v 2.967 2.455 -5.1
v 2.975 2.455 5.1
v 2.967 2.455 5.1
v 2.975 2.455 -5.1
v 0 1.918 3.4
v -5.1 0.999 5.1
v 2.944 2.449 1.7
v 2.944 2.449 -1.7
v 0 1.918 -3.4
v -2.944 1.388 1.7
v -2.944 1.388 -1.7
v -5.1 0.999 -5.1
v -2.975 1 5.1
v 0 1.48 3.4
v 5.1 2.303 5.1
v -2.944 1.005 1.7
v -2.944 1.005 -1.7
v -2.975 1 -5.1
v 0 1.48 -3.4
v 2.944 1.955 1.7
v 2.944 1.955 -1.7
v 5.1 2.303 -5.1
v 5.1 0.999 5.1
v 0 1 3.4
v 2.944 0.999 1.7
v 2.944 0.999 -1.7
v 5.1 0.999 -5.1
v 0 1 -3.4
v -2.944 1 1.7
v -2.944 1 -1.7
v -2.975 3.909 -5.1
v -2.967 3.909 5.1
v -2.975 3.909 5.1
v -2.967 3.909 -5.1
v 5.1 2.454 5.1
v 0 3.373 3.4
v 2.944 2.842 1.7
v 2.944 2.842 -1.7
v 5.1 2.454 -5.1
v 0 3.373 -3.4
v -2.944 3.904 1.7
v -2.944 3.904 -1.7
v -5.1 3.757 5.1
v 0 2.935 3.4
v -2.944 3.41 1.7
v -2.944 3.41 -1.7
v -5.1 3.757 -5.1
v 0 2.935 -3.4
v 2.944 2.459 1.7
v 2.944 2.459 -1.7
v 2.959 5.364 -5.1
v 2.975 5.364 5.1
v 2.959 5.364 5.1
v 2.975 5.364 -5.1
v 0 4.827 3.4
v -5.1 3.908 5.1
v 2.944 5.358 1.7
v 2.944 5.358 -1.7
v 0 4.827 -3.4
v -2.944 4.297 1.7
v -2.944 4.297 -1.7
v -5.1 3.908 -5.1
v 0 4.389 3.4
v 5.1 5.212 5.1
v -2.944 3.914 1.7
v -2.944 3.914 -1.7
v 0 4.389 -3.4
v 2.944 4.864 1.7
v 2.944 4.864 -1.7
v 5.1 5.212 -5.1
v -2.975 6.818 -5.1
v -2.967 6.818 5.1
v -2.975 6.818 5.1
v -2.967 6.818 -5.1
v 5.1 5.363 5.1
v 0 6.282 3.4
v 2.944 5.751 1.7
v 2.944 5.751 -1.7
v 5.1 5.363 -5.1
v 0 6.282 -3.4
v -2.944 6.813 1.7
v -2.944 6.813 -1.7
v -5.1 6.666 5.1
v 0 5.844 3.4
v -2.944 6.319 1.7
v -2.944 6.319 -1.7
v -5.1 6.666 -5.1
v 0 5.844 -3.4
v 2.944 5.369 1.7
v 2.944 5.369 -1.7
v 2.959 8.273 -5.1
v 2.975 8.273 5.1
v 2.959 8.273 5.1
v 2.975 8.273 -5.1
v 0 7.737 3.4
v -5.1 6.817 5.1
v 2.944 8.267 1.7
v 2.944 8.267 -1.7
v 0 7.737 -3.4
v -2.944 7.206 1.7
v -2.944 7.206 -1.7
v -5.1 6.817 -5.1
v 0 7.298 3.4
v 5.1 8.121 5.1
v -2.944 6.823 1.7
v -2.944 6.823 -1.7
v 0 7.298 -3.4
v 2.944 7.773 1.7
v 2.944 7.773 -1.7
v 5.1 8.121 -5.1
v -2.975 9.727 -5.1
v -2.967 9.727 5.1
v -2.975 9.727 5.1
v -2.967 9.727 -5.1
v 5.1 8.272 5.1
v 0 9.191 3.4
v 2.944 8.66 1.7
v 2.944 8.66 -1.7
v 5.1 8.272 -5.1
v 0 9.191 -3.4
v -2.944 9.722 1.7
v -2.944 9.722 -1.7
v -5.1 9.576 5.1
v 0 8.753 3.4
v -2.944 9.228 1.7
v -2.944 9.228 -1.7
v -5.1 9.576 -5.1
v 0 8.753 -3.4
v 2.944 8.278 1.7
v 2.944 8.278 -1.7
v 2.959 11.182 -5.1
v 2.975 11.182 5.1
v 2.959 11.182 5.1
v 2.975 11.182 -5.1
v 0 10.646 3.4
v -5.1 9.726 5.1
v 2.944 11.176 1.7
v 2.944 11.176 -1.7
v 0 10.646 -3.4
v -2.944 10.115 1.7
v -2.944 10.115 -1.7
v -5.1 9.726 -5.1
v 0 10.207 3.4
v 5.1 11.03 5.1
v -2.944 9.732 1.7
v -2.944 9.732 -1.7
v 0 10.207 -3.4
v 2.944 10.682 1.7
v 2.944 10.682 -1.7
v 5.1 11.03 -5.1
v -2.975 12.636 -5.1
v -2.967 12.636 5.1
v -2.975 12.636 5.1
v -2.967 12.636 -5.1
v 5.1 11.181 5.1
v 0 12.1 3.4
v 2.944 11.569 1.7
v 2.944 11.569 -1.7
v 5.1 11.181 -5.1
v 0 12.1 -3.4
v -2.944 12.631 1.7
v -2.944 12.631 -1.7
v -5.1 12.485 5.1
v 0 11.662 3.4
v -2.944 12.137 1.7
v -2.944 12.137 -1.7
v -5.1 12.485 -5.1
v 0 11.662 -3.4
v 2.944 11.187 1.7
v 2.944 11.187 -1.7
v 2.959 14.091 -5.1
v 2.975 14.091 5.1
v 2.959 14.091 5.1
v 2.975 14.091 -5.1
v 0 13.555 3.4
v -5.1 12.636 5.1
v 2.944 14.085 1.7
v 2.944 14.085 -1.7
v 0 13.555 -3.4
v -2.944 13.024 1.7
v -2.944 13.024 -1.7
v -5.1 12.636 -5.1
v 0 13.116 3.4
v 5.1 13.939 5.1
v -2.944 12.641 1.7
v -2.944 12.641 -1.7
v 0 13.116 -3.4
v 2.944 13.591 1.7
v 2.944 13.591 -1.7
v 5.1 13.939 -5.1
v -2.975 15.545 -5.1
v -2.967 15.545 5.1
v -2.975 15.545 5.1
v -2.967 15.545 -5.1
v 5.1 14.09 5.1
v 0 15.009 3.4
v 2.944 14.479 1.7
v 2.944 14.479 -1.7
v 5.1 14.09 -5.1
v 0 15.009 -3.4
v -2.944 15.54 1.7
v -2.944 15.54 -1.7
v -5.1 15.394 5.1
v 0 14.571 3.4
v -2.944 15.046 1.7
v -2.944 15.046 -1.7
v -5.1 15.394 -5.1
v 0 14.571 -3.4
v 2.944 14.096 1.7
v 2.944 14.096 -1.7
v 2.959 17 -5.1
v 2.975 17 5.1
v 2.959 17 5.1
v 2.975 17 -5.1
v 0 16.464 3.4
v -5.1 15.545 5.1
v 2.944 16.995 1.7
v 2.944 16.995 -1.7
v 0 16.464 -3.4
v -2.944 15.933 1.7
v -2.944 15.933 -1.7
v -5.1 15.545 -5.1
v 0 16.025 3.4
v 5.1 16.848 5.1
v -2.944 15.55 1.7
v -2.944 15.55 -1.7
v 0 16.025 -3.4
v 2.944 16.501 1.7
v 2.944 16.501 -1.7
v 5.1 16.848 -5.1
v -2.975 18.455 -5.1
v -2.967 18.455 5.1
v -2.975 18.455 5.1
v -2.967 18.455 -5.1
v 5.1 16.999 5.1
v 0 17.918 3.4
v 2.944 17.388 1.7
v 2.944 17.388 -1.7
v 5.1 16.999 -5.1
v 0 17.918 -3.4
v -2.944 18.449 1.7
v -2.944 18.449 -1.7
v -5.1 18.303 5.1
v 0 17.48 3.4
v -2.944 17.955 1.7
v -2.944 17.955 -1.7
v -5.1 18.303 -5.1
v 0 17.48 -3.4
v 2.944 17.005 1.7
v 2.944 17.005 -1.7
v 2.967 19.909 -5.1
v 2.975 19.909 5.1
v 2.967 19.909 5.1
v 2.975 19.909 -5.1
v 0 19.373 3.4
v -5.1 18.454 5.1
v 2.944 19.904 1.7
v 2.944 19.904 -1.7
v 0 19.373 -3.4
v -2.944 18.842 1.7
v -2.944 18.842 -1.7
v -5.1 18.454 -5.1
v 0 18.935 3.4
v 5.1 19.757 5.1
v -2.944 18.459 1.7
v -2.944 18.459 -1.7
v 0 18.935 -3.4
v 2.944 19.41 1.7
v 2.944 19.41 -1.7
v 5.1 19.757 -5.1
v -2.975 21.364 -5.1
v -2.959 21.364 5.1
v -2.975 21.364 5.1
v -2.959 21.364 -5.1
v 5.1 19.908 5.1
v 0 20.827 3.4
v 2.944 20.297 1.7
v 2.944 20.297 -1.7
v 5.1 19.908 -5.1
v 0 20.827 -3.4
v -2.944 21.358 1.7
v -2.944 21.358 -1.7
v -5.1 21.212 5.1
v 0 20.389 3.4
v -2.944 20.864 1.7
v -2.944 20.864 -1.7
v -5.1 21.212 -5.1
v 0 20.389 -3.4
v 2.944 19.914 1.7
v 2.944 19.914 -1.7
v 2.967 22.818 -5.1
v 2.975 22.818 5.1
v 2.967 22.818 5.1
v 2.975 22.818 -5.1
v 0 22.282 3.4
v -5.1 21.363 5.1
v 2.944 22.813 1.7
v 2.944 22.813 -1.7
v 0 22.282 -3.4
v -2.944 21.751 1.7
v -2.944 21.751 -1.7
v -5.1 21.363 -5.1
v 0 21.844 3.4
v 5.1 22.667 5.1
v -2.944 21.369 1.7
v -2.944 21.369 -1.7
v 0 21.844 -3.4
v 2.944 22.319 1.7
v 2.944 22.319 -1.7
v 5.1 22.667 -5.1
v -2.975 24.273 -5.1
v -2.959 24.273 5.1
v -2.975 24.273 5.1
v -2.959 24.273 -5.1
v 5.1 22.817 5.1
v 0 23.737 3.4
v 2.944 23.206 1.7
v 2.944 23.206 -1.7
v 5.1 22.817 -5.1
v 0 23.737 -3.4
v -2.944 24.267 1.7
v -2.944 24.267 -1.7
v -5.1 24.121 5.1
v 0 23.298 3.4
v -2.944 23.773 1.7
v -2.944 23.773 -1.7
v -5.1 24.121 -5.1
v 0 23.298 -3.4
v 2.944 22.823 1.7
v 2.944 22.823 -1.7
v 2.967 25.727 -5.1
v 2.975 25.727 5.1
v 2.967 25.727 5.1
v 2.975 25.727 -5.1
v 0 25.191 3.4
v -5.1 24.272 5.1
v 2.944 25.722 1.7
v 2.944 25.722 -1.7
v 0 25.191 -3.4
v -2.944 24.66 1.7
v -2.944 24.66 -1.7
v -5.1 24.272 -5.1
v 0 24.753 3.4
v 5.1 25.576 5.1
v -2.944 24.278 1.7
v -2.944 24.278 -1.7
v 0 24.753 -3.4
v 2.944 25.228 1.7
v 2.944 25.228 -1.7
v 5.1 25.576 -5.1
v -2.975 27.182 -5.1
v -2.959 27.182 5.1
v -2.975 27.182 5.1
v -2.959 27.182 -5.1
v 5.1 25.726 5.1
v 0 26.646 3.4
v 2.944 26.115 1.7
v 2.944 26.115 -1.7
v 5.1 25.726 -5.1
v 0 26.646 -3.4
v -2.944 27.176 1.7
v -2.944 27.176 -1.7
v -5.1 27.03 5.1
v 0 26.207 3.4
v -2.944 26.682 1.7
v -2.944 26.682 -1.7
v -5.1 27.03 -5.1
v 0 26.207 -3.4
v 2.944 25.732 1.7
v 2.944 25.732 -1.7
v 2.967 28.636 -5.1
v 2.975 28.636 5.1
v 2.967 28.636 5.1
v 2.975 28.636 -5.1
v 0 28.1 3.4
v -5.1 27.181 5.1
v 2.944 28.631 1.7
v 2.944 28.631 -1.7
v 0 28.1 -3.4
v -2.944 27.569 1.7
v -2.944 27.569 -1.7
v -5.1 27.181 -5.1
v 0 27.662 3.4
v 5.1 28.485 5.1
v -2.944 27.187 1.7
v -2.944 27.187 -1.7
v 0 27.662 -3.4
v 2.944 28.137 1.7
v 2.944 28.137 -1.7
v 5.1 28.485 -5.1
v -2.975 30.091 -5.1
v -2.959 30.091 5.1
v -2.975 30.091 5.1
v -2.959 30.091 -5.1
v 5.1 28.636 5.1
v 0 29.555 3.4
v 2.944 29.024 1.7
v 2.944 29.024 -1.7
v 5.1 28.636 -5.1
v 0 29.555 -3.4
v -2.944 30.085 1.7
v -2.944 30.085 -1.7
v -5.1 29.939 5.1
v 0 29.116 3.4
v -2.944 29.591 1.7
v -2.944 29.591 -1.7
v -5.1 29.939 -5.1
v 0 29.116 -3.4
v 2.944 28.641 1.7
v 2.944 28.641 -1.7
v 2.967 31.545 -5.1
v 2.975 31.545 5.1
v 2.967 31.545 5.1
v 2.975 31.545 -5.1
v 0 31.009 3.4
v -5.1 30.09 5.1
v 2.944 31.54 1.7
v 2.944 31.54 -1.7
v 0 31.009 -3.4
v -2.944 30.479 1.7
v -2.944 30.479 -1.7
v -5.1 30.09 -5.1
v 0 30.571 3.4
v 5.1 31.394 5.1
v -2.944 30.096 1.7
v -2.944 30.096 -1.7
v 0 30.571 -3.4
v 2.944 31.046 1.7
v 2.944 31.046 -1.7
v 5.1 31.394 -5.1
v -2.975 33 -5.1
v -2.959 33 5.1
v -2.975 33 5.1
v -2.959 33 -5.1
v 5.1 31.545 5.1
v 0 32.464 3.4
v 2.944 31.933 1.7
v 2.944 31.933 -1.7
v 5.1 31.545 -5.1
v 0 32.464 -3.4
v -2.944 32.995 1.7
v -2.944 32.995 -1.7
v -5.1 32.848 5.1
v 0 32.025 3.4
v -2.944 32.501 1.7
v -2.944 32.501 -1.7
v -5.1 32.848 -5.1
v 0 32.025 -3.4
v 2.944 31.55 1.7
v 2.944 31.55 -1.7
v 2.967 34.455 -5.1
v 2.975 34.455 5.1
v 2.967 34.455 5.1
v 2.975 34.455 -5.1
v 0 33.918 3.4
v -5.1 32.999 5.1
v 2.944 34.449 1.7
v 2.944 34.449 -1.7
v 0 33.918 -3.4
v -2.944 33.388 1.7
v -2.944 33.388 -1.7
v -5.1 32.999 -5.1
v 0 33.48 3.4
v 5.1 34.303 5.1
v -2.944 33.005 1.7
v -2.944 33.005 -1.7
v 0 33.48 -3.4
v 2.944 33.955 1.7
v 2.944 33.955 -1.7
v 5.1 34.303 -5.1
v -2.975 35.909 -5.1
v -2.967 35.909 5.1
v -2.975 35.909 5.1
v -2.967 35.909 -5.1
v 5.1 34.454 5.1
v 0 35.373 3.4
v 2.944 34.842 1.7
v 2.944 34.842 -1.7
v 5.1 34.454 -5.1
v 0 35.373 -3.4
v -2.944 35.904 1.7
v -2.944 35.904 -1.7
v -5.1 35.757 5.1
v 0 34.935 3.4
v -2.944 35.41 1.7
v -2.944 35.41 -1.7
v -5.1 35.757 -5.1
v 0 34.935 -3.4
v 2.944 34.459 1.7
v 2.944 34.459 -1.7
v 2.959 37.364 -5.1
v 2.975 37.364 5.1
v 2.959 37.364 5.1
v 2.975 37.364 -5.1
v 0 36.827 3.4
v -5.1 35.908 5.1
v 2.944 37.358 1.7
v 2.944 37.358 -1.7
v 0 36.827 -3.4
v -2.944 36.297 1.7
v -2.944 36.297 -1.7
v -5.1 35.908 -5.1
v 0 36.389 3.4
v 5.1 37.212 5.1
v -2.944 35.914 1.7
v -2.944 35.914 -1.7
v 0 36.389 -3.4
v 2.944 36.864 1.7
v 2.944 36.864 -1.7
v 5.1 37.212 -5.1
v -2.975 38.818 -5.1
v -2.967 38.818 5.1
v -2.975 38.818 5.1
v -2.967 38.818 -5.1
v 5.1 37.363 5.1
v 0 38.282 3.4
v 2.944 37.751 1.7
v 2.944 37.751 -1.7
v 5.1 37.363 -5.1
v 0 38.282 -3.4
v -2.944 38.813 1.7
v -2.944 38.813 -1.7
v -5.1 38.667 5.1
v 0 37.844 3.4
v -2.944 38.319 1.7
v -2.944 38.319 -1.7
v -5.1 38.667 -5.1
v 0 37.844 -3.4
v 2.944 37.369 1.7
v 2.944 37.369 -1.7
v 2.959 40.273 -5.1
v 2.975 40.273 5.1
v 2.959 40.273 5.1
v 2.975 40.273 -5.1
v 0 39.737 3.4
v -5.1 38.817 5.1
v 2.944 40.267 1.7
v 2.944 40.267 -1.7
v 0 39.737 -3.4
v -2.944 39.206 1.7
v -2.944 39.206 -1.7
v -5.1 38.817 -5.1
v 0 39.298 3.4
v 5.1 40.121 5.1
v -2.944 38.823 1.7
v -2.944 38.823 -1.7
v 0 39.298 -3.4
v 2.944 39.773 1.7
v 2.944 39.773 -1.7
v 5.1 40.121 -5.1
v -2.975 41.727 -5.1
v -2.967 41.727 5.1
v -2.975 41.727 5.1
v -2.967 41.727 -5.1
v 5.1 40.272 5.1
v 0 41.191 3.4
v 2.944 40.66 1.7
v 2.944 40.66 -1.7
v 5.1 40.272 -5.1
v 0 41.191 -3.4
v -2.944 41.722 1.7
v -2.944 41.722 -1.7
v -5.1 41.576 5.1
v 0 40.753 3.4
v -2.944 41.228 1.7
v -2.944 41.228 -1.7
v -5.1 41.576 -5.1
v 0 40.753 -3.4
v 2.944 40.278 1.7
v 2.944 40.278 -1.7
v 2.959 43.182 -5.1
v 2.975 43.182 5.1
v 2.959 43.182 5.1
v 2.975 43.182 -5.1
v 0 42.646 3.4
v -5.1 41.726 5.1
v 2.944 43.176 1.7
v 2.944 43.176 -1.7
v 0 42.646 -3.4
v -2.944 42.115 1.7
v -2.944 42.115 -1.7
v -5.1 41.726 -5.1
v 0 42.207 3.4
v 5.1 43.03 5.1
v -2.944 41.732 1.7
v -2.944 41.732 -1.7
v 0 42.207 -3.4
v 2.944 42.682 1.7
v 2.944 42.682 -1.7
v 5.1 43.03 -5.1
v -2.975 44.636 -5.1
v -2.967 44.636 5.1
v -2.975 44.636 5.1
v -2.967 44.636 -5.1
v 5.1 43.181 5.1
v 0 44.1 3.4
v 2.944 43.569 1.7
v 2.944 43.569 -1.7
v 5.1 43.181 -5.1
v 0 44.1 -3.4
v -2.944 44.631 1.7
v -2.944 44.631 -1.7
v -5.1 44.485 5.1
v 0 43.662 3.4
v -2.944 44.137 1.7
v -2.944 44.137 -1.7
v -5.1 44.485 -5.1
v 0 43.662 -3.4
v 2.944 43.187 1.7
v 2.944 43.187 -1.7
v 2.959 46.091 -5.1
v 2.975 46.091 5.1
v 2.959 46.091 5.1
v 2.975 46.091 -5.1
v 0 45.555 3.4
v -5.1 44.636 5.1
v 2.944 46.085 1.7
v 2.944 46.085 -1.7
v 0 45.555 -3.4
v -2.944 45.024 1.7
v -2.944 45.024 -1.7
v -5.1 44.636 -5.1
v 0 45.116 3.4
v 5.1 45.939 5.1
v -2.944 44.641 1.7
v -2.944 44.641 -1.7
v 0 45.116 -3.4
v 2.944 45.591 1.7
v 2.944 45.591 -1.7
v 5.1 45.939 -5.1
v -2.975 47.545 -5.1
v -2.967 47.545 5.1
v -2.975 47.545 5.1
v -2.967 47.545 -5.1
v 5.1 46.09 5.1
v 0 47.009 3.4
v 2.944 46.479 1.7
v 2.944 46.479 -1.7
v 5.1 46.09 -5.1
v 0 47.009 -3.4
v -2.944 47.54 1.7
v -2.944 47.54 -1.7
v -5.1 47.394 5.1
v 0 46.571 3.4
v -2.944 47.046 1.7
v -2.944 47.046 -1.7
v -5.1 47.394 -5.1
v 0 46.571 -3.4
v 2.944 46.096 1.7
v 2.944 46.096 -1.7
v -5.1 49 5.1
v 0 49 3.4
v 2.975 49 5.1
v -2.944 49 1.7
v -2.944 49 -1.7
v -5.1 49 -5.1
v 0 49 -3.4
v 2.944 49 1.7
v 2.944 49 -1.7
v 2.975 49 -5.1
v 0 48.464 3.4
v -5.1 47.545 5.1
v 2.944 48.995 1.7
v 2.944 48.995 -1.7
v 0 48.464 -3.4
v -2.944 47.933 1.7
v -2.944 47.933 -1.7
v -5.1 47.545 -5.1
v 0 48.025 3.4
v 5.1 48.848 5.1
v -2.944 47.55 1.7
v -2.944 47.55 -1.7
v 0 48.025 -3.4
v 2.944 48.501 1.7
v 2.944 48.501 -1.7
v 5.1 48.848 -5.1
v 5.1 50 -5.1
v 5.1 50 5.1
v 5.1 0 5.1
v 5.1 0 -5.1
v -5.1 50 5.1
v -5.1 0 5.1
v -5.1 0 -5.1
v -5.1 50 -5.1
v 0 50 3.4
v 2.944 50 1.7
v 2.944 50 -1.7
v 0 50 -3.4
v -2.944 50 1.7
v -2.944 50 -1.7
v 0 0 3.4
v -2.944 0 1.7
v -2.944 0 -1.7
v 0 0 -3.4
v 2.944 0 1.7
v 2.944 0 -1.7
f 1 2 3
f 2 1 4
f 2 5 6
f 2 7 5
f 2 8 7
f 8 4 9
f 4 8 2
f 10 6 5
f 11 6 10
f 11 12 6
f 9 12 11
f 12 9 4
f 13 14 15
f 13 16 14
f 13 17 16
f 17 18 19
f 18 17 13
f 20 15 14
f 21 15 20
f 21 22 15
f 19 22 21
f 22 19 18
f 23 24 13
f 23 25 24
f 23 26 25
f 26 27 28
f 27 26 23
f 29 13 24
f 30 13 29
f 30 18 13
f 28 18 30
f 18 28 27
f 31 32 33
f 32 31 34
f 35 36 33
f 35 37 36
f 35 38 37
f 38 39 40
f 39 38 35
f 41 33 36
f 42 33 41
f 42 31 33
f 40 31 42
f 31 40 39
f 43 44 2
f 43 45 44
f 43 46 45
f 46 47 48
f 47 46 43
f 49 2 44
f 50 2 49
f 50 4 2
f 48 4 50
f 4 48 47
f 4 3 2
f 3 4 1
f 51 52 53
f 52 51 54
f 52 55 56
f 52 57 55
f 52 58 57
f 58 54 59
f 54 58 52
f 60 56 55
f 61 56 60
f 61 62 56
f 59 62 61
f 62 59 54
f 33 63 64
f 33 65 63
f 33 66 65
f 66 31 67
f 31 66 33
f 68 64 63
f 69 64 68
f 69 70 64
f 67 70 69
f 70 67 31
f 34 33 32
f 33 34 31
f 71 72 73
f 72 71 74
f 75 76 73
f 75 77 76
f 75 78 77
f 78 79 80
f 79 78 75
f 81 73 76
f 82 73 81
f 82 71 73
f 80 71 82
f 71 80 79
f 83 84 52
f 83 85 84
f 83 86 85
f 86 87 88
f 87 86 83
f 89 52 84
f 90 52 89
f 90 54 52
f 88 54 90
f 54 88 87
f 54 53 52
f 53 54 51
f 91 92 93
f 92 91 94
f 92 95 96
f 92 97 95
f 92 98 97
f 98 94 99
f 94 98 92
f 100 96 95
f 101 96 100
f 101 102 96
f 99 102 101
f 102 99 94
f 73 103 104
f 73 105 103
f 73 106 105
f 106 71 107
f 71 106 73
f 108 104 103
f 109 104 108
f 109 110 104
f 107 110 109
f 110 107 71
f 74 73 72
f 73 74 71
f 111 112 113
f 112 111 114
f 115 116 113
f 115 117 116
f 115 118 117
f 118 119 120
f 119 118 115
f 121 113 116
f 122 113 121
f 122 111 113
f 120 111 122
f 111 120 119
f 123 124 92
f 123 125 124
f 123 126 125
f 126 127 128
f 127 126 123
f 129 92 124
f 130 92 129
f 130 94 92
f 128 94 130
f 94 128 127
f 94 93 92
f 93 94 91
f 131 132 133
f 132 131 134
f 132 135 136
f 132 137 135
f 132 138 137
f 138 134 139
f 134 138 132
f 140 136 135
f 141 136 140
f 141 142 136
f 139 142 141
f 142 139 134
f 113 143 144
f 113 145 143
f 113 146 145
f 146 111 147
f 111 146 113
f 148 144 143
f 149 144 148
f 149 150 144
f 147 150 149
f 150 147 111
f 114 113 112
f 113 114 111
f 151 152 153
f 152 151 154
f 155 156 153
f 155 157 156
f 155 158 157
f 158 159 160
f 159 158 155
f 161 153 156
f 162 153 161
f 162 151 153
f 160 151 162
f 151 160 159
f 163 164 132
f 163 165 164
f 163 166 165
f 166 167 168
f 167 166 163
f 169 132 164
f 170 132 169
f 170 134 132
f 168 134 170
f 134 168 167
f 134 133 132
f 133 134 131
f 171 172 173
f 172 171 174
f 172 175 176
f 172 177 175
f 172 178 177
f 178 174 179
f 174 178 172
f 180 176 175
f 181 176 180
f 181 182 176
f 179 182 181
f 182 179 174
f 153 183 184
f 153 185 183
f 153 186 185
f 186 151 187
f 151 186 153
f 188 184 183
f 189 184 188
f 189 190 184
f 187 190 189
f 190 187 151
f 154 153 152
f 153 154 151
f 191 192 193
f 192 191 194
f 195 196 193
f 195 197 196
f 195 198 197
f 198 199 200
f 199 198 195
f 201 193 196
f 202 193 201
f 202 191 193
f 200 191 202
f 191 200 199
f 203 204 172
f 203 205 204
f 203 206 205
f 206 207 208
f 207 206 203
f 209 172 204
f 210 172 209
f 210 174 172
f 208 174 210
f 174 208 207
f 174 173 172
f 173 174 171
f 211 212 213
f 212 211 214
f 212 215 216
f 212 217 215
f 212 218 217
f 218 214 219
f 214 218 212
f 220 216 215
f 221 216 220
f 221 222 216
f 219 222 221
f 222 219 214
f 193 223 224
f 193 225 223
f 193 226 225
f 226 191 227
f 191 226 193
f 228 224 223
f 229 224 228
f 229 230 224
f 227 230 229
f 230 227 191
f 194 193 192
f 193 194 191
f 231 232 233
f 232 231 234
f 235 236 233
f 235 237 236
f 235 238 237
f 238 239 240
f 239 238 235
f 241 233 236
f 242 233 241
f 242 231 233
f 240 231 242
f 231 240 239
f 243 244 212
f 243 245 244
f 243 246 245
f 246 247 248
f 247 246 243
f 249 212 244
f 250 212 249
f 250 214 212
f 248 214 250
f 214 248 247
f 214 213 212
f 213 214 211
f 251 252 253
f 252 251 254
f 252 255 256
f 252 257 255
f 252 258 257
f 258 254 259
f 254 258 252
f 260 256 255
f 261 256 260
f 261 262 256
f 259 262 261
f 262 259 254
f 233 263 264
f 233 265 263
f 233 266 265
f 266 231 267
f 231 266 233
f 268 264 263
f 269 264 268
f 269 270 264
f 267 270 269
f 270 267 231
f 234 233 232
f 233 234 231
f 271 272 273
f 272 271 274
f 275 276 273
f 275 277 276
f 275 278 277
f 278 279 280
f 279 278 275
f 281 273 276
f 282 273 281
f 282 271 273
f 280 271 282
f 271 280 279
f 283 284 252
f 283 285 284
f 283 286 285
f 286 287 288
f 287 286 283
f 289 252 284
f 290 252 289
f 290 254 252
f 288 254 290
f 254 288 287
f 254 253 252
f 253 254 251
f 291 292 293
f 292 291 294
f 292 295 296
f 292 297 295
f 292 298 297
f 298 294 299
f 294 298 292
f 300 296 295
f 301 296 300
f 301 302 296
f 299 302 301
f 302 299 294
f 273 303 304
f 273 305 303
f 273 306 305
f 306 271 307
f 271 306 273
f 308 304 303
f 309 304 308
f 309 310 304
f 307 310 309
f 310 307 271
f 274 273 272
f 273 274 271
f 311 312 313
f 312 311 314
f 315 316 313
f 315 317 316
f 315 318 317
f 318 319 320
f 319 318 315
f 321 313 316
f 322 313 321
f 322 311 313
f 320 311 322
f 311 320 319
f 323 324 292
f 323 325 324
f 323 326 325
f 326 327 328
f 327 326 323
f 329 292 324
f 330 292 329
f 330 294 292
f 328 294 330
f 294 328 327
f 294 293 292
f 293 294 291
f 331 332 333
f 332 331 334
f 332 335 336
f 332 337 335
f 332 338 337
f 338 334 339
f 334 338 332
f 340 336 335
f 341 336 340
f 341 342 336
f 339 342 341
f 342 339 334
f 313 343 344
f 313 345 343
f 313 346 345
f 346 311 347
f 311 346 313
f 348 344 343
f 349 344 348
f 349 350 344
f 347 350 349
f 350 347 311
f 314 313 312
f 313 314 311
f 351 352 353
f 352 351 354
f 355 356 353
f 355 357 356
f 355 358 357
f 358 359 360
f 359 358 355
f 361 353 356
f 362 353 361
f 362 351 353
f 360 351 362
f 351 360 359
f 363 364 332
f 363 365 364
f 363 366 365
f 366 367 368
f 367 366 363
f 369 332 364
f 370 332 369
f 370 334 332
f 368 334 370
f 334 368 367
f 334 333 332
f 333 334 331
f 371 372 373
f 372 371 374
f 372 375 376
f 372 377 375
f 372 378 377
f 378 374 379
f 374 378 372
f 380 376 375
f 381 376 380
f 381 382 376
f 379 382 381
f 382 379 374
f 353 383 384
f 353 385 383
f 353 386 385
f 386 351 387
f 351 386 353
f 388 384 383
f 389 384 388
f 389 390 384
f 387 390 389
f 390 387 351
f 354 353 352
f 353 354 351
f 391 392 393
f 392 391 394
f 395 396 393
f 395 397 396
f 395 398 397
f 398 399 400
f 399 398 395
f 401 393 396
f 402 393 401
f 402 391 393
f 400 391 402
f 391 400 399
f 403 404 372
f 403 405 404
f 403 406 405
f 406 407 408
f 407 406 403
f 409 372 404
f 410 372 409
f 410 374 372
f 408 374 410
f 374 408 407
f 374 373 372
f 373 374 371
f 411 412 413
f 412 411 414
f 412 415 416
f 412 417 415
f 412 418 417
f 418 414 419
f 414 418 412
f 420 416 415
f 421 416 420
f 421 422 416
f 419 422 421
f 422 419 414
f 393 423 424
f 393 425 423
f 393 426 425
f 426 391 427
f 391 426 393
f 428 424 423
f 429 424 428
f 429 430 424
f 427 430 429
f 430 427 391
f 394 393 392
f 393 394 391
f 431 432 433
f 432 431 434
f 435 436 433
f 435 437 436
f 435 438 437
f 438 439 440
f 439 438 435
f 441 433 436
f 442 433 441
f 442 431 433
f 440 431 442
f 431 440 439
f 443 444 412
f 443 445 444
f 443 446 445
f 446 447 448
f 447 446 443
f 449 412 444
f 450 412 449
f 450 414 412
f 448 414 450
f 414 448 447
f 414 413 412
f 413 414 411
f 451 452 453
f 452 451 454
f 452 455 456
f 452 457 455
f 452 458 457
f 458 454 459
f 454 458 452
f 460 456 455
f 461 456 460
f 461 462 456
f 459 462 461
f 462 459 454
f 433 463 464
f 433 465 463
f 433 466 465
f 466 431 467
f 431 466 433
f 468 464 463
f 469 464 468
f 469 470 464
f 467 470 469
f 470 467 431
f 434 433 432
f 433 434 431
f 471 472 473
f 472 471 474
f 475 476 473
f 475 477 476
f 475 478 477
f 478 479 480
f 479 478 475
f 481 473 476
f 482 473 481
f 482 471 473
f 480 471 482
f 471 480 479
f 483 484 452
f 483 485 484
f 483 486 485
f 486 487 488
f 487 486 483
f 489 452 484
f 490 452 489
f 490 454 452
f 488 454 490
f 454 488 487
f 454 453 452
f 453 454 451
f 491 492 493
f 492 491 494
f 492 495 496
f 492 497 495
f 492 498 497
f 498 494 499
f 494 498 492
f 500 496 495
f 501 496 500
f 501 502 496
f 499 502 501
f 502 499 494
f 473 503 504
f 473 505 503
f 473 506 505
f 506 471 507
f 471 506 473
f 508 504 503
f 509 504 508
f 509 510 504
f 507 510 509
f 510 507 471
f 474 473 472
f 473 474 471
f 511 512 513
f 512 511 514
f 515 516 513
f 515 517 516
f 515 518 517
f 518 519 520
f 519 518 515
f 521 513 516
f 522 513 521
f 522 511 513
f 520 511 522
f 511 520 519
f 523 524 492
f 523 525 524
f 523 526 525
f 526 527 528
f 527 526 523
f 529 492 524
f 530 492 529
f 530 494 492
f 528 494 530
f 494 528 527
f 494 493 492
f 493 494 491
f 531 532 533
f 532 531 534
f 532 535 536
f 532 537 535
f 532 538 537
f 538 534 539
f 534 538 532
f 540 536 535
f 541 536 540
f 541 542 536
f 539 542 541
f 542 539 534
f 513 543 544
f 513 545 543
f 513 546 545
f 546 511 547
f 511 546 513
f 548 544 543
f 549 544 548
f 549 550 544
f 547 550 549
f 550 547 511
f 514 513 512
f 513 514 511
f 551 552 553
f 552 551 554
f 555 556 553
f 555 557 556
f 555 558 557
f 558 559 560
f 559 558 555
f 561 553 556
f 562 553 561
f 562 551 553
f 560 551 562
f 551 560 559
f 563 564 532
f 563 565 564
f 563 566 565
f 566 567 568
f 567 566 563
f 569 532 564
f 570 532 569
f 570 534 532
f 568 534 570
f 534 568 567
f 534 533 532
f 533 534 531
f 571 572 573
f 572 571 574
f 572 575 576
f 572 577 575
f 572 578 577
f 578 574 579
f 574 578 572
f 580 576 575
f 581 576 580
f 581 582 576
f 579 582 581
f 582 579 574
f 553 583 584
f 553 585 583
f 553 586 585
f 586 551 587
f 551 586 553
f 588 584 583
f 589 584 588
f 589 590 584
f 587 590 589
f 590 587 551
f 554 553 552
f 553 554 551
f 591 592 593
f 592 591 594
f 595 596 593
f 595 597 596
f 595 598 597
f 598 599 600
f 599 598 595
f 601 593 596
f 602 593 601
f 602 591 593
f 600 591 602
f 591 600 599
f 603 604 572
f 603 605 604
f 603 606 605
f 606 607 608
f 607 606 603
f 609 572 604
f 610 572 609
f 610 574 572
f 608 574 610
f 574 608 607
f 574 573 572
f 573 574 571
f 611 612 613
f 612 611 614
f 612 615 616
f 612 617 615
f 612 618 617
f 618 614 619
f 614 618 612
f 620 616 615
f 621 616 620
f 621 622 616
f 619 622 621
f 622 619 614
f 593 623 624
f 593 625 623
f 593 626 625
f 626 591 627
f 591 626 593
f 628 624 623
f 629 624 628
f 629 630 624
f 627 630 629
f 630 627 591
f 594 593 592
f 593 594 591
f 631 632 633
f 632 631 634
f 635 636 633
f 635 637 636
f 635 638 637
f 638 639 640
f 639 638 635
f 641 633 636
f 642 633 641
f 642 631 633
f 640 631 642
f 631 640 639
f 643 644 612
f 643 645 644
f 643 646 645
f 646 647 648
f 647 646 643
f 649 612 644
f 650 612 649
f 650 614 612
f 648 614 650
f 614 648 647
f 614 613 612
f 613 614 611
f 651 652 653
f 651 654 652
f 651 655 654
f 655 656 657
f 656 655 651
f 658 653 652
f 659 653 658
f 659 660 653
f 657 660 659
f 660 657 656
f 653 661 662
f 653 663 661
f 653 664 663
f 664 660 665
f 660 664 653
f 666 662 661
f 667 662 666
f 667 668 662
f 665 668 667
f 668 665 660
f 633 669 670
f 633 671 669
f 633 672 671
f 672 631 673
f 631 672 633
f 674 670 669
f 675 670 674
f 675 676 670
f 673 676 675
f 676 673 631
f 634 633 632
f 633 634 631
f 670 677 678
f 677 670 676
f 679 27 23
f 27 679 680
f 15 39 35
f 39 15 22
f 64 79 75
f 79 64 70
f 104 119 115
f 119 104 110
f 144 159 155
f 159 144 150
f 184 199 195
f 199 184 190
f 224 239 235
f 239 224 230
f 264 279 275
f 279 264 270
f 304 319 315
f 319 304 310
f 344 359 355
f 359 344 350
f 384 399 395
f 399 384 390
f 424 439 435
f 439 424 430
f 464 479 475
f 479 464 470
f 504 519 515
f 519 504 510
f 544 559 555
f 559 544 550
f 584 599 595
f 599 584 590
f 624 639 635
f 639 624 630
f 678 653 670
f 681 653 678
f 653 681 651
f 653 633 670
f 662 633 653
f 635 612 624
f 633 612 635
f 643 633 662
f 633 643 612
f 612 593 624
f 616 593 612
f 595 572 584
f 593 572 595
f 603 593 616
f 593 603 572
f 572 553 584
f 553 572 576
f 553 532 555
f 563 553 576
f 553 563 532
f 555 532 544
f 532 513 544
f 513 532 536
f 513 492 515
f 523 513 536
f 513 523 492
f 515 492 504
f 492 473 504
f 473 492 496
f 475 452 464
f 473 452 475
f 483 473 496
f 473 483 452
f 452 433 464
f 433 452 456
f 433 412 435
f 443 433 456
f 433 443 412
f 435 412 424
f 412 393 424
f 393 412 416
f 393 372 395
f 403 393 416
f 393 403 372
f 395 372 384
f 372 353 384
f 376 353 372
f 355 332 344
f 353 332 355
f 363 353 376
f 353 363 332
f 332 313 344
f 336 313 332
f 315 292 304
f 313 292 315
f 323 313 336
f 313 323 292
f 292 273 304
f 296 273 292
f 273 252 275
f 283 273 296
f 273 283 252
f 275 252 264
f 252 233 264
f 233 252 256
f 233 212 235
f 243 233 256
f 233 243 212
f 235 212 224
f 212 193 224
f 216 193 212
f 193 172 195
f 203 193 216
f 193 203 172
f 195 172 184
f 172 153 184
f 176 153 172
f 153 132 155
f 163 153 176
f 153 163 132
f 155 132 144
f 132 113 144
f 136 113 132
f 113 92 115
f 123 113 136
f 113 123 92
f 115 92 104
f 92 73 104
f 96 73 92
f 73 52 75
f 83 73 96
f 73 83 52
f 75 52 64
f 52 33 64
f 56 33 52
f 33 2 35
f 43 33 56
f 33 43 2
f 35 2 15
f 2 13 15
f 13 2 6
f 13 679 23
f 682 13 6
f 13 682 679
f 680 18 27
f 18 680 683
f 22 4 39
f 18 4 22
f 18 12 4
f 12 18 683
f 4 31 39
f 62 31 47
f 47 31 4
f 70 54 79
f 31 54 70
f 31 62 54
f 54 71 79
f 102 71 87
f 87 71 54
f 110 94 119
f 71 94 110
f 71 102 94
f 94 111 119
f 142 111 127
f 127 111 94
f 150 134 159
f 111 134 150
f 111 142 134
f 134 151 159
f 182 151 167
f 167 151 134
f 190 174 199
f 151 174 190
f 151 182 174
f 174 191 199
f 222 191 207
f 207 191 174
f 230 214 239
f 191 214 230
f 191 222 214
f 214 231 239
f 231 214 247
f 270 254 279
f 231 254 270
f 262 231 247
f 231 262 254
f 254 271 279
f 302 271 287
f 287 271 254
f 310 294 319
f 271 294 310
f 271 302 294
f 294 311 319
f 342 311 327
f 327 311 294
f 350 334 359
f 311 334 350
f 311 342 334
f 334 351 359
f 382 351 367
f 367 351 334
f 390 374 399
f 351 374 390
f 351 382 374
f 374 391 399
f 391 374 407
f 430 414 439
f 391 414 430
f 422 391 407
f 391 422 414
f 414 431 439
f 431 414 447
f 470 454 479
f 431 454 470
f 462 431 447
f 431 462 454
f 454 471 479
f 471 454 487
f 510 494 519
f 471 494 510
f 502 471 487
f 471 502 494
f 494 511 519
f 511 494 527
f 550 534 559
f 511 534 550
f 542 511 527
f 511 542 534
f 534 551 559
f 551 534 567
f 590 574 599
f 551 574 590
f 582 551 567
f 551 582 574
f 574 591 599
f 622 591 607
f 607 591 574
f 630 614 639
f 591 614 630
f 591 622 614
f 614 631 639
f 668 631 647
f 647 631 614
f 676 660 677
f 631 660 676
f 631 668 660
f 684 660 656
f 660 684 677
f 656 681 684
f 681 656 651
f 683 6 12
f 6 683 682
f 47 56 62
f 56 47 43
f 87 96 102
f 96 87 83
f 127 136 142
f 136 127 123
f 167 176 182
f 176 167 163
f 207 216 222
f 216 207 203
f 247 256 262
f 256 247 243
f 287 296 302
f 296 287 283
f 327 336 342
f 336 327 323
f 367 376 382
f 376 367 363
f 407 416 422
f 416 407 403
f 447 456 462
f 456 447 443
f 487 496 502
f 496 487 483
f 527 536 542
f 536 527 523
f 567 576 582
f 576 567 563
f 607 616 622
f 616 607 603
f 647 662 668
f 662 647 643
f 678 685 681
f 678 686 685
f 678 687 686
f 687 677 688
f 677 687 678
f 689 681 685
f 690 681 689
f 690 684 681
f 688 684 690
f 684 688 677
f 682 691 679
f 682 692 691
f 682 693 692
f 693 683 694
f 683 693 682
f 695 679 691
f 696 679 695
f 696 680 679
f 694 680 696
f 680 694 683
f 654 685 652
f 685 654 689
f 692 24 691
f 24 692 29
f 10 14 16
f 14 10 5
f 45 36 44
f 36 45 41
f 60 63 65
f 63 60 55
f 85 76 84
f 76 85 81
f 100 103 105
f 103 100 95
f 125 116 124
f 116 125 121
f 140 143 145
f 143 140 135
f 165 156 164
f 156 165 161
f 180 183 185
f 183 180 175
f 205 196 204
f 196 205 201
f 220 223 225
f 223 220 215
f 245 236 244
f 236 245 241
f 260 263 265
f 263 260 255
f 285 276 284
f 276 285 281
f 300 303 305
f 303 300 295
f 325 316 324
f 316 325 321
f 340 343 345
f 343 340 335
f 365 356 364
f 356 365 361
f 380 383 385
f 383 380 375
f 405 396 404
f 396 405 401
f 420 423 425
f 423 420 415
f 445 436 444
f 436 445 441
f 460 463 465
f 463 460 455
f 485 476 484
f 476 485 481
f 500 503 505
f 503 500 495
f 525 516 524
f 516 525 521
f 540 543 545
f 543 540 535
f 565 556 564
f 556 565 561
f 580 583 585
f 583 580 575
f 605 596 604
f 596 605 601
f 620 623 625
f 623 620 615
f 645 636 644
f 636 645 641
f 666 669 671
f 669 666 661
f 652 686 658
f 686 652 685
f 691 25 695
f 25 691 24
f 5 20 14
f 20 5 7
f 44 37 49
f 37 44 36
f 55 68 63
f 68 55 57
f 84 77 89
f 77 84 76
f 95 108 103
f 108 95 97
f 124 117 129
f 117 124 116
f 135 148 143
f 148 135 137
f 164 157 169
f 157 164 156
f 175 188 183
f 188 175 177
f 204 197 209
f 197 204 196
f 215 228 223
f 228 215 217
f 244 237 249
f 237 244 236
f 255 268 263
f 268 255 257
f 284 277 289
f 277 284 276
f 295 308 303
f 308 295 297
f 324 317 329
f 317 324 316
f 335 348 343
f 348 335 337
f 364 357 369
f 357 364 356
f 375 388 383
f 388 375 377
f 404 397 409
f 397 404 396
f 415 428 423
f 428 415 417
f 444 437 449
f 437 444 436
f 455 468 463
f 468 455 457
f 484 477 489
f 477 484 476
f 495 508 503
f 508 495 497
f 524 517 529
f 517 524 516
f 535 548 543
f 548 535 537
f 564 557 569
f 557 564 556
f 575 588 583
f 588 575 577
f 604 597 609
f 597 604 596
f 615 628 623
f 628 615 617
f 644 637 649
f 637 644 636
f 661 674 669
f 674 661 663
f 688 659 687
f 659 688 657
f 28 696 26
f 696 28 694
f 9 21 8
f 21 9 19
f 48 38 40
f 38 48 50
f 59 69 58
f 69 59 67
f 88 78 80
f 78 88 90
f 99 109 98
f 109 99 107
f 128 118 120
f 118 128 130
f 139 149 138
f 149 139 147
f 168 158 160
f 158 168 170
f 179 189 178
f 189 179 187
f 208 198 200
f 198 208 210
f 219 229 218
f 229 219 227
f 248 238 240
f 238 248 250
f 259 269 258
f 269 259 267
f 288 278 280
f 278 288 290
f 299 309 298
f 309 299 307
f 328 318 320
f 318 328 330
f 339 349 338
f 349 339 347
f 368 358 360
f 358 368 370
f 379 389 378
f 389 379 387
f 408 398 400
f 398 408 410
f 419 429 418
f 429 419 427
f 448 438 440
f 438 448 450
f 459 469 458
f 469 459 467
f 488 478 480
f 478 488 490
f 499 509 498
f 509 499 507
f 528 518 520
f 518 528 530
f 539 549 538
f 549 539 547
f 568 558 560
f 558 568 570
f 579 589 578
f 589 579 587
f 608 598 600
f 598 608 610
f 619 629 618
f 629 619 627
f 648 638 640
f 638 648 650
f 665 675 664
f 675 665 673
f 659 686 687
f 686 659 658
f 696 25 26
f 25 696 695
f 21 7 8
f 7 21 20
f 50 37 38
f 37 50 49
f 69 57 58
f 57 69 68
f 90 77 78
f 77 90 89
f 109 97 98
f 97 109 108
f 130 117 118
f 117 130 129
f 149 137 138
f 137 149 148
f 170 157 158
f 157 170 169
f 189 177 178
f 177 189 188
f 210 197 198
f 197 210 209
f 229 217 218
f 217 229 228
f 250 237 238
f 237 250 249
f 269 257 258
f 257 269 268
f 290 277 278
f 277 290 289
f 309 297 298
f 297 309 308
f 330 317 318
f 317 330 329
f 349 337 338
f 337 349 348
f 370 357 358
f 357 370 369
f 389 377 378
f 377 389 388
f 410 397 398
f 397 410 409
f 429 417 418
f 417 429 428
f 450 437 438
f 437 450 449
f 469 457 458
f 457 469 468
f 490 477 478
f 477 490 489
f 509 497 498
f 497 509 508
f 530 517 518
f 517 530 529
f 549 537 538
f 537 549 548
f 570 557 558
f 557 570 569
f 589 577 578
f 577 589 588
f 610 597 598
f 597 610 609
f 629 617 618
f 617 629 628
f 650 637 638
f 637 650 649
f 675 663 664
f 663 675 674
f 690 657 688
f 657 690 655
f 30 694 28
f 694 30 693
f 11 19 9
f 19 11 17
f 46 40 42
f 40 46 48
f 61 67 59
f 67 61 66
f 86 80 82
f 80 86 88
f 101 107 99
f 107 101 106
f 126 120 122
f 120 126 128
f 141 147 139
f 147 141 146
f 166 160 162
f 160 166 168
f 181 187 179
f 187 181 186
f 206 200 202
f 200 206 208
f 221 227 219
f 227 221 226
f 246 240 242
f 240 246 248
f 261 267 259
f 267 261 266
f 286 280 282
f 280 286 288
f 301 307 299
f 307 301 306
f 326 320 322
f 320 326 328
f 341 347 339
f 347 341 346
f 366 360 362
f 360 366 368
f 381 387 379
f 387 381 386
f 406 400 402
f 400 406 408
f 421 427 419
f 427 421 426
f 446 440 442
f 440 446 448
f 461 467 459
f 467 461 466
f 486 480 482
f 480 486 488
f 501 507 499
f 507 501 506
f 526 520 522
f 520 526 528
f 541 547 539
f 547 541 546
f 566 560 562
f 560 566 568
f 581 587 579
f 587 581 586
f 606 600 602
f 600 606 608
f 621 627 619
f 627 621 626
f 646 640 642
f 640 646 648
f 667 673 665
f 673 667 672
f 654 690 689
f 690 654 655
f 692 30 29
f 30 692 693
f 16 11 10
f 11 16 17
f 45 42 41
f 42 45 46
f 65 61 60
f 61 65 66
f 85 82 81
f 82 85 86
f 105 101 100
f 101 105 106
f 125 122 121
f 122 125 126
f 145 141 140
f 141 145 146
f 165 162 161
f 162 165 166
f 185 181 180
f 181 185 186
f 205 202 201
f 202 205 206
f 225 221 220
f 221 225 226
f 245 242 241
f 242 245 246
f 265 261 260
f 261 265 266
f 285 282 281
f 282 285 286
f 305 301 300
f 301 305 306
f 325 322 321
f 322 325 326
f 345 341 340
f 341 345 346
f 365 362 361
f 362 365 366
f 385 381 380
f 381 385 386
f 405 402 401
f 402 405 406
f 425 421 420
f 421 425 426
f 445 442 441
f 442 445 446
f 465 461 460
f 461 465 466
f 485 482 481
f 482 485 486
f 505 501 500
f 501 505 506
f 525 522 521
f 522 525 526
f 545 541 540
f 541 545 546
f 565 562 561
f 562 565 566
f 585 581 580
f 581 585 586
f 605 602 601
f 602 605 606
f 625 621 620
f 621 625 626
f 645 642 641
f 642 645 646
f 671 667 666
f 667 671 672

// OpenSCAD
//  Amount of edges of the hole through the spring
$fn = 6;

//  Radius of the hole through the spring
radius = 3.4;

//  Dimension of the spring
base = 10.2;

//  Height of the base plates of the spring
baseHeight = 1;

//  Thickness of the spring
thickness = 0.3;

//  Length of the spring
length = 50;

//  Amount of leaves in the spring
amount = 33;

module spring(){
    leaveHeight = (length - 2 * baseHeight) / amount;
    ty = thickness / (2 * cos(atan(leaveHeight / base)));
    tx = thickness / (sin(atan(leaveHeight / base)));
    tolerance = 0.001;
    
    difference(){
        translate([-1/2 * base, 0, -1/2 * base]){
            cube([base, length, base]);
        }
        rotate([-90, -30, 0]){
            translate([0, 0, -0.1]){
                cylinder(r = radius, h = length + 0.2);
            }
        }
        translate([0, baseHeight, 0]){
            for(i = [1:amount]){
                rotate([0, i * 180, 0]){
                    translate([0, (i - 1) * leaveHeight, -(1/2 * base + 0.1)]){
                        linear_extrude(height =  base + 0.2){
                            polygon(    points  =   [   [-1/2 * base - tolerance, -tolerance],
                                                        [1/2 * base - tx, 0],
                                                        [-1/2 * base - tolerance, leaveHeight - ty]  ],
                                        paths   =   [[0,1,2]]   );
                            polygon(    points  =   [   [1/2 * base + tolerance, -tolerance],
                                                        [1/2 * base + tolerance, leaveHeight],
                                                        [-1/2 * base + tx, leaveHeight]  ],
                                        paths   =   [[0,1,2]]   );
                        }
                    }
                }
            }
        }
    }
}

spring();
